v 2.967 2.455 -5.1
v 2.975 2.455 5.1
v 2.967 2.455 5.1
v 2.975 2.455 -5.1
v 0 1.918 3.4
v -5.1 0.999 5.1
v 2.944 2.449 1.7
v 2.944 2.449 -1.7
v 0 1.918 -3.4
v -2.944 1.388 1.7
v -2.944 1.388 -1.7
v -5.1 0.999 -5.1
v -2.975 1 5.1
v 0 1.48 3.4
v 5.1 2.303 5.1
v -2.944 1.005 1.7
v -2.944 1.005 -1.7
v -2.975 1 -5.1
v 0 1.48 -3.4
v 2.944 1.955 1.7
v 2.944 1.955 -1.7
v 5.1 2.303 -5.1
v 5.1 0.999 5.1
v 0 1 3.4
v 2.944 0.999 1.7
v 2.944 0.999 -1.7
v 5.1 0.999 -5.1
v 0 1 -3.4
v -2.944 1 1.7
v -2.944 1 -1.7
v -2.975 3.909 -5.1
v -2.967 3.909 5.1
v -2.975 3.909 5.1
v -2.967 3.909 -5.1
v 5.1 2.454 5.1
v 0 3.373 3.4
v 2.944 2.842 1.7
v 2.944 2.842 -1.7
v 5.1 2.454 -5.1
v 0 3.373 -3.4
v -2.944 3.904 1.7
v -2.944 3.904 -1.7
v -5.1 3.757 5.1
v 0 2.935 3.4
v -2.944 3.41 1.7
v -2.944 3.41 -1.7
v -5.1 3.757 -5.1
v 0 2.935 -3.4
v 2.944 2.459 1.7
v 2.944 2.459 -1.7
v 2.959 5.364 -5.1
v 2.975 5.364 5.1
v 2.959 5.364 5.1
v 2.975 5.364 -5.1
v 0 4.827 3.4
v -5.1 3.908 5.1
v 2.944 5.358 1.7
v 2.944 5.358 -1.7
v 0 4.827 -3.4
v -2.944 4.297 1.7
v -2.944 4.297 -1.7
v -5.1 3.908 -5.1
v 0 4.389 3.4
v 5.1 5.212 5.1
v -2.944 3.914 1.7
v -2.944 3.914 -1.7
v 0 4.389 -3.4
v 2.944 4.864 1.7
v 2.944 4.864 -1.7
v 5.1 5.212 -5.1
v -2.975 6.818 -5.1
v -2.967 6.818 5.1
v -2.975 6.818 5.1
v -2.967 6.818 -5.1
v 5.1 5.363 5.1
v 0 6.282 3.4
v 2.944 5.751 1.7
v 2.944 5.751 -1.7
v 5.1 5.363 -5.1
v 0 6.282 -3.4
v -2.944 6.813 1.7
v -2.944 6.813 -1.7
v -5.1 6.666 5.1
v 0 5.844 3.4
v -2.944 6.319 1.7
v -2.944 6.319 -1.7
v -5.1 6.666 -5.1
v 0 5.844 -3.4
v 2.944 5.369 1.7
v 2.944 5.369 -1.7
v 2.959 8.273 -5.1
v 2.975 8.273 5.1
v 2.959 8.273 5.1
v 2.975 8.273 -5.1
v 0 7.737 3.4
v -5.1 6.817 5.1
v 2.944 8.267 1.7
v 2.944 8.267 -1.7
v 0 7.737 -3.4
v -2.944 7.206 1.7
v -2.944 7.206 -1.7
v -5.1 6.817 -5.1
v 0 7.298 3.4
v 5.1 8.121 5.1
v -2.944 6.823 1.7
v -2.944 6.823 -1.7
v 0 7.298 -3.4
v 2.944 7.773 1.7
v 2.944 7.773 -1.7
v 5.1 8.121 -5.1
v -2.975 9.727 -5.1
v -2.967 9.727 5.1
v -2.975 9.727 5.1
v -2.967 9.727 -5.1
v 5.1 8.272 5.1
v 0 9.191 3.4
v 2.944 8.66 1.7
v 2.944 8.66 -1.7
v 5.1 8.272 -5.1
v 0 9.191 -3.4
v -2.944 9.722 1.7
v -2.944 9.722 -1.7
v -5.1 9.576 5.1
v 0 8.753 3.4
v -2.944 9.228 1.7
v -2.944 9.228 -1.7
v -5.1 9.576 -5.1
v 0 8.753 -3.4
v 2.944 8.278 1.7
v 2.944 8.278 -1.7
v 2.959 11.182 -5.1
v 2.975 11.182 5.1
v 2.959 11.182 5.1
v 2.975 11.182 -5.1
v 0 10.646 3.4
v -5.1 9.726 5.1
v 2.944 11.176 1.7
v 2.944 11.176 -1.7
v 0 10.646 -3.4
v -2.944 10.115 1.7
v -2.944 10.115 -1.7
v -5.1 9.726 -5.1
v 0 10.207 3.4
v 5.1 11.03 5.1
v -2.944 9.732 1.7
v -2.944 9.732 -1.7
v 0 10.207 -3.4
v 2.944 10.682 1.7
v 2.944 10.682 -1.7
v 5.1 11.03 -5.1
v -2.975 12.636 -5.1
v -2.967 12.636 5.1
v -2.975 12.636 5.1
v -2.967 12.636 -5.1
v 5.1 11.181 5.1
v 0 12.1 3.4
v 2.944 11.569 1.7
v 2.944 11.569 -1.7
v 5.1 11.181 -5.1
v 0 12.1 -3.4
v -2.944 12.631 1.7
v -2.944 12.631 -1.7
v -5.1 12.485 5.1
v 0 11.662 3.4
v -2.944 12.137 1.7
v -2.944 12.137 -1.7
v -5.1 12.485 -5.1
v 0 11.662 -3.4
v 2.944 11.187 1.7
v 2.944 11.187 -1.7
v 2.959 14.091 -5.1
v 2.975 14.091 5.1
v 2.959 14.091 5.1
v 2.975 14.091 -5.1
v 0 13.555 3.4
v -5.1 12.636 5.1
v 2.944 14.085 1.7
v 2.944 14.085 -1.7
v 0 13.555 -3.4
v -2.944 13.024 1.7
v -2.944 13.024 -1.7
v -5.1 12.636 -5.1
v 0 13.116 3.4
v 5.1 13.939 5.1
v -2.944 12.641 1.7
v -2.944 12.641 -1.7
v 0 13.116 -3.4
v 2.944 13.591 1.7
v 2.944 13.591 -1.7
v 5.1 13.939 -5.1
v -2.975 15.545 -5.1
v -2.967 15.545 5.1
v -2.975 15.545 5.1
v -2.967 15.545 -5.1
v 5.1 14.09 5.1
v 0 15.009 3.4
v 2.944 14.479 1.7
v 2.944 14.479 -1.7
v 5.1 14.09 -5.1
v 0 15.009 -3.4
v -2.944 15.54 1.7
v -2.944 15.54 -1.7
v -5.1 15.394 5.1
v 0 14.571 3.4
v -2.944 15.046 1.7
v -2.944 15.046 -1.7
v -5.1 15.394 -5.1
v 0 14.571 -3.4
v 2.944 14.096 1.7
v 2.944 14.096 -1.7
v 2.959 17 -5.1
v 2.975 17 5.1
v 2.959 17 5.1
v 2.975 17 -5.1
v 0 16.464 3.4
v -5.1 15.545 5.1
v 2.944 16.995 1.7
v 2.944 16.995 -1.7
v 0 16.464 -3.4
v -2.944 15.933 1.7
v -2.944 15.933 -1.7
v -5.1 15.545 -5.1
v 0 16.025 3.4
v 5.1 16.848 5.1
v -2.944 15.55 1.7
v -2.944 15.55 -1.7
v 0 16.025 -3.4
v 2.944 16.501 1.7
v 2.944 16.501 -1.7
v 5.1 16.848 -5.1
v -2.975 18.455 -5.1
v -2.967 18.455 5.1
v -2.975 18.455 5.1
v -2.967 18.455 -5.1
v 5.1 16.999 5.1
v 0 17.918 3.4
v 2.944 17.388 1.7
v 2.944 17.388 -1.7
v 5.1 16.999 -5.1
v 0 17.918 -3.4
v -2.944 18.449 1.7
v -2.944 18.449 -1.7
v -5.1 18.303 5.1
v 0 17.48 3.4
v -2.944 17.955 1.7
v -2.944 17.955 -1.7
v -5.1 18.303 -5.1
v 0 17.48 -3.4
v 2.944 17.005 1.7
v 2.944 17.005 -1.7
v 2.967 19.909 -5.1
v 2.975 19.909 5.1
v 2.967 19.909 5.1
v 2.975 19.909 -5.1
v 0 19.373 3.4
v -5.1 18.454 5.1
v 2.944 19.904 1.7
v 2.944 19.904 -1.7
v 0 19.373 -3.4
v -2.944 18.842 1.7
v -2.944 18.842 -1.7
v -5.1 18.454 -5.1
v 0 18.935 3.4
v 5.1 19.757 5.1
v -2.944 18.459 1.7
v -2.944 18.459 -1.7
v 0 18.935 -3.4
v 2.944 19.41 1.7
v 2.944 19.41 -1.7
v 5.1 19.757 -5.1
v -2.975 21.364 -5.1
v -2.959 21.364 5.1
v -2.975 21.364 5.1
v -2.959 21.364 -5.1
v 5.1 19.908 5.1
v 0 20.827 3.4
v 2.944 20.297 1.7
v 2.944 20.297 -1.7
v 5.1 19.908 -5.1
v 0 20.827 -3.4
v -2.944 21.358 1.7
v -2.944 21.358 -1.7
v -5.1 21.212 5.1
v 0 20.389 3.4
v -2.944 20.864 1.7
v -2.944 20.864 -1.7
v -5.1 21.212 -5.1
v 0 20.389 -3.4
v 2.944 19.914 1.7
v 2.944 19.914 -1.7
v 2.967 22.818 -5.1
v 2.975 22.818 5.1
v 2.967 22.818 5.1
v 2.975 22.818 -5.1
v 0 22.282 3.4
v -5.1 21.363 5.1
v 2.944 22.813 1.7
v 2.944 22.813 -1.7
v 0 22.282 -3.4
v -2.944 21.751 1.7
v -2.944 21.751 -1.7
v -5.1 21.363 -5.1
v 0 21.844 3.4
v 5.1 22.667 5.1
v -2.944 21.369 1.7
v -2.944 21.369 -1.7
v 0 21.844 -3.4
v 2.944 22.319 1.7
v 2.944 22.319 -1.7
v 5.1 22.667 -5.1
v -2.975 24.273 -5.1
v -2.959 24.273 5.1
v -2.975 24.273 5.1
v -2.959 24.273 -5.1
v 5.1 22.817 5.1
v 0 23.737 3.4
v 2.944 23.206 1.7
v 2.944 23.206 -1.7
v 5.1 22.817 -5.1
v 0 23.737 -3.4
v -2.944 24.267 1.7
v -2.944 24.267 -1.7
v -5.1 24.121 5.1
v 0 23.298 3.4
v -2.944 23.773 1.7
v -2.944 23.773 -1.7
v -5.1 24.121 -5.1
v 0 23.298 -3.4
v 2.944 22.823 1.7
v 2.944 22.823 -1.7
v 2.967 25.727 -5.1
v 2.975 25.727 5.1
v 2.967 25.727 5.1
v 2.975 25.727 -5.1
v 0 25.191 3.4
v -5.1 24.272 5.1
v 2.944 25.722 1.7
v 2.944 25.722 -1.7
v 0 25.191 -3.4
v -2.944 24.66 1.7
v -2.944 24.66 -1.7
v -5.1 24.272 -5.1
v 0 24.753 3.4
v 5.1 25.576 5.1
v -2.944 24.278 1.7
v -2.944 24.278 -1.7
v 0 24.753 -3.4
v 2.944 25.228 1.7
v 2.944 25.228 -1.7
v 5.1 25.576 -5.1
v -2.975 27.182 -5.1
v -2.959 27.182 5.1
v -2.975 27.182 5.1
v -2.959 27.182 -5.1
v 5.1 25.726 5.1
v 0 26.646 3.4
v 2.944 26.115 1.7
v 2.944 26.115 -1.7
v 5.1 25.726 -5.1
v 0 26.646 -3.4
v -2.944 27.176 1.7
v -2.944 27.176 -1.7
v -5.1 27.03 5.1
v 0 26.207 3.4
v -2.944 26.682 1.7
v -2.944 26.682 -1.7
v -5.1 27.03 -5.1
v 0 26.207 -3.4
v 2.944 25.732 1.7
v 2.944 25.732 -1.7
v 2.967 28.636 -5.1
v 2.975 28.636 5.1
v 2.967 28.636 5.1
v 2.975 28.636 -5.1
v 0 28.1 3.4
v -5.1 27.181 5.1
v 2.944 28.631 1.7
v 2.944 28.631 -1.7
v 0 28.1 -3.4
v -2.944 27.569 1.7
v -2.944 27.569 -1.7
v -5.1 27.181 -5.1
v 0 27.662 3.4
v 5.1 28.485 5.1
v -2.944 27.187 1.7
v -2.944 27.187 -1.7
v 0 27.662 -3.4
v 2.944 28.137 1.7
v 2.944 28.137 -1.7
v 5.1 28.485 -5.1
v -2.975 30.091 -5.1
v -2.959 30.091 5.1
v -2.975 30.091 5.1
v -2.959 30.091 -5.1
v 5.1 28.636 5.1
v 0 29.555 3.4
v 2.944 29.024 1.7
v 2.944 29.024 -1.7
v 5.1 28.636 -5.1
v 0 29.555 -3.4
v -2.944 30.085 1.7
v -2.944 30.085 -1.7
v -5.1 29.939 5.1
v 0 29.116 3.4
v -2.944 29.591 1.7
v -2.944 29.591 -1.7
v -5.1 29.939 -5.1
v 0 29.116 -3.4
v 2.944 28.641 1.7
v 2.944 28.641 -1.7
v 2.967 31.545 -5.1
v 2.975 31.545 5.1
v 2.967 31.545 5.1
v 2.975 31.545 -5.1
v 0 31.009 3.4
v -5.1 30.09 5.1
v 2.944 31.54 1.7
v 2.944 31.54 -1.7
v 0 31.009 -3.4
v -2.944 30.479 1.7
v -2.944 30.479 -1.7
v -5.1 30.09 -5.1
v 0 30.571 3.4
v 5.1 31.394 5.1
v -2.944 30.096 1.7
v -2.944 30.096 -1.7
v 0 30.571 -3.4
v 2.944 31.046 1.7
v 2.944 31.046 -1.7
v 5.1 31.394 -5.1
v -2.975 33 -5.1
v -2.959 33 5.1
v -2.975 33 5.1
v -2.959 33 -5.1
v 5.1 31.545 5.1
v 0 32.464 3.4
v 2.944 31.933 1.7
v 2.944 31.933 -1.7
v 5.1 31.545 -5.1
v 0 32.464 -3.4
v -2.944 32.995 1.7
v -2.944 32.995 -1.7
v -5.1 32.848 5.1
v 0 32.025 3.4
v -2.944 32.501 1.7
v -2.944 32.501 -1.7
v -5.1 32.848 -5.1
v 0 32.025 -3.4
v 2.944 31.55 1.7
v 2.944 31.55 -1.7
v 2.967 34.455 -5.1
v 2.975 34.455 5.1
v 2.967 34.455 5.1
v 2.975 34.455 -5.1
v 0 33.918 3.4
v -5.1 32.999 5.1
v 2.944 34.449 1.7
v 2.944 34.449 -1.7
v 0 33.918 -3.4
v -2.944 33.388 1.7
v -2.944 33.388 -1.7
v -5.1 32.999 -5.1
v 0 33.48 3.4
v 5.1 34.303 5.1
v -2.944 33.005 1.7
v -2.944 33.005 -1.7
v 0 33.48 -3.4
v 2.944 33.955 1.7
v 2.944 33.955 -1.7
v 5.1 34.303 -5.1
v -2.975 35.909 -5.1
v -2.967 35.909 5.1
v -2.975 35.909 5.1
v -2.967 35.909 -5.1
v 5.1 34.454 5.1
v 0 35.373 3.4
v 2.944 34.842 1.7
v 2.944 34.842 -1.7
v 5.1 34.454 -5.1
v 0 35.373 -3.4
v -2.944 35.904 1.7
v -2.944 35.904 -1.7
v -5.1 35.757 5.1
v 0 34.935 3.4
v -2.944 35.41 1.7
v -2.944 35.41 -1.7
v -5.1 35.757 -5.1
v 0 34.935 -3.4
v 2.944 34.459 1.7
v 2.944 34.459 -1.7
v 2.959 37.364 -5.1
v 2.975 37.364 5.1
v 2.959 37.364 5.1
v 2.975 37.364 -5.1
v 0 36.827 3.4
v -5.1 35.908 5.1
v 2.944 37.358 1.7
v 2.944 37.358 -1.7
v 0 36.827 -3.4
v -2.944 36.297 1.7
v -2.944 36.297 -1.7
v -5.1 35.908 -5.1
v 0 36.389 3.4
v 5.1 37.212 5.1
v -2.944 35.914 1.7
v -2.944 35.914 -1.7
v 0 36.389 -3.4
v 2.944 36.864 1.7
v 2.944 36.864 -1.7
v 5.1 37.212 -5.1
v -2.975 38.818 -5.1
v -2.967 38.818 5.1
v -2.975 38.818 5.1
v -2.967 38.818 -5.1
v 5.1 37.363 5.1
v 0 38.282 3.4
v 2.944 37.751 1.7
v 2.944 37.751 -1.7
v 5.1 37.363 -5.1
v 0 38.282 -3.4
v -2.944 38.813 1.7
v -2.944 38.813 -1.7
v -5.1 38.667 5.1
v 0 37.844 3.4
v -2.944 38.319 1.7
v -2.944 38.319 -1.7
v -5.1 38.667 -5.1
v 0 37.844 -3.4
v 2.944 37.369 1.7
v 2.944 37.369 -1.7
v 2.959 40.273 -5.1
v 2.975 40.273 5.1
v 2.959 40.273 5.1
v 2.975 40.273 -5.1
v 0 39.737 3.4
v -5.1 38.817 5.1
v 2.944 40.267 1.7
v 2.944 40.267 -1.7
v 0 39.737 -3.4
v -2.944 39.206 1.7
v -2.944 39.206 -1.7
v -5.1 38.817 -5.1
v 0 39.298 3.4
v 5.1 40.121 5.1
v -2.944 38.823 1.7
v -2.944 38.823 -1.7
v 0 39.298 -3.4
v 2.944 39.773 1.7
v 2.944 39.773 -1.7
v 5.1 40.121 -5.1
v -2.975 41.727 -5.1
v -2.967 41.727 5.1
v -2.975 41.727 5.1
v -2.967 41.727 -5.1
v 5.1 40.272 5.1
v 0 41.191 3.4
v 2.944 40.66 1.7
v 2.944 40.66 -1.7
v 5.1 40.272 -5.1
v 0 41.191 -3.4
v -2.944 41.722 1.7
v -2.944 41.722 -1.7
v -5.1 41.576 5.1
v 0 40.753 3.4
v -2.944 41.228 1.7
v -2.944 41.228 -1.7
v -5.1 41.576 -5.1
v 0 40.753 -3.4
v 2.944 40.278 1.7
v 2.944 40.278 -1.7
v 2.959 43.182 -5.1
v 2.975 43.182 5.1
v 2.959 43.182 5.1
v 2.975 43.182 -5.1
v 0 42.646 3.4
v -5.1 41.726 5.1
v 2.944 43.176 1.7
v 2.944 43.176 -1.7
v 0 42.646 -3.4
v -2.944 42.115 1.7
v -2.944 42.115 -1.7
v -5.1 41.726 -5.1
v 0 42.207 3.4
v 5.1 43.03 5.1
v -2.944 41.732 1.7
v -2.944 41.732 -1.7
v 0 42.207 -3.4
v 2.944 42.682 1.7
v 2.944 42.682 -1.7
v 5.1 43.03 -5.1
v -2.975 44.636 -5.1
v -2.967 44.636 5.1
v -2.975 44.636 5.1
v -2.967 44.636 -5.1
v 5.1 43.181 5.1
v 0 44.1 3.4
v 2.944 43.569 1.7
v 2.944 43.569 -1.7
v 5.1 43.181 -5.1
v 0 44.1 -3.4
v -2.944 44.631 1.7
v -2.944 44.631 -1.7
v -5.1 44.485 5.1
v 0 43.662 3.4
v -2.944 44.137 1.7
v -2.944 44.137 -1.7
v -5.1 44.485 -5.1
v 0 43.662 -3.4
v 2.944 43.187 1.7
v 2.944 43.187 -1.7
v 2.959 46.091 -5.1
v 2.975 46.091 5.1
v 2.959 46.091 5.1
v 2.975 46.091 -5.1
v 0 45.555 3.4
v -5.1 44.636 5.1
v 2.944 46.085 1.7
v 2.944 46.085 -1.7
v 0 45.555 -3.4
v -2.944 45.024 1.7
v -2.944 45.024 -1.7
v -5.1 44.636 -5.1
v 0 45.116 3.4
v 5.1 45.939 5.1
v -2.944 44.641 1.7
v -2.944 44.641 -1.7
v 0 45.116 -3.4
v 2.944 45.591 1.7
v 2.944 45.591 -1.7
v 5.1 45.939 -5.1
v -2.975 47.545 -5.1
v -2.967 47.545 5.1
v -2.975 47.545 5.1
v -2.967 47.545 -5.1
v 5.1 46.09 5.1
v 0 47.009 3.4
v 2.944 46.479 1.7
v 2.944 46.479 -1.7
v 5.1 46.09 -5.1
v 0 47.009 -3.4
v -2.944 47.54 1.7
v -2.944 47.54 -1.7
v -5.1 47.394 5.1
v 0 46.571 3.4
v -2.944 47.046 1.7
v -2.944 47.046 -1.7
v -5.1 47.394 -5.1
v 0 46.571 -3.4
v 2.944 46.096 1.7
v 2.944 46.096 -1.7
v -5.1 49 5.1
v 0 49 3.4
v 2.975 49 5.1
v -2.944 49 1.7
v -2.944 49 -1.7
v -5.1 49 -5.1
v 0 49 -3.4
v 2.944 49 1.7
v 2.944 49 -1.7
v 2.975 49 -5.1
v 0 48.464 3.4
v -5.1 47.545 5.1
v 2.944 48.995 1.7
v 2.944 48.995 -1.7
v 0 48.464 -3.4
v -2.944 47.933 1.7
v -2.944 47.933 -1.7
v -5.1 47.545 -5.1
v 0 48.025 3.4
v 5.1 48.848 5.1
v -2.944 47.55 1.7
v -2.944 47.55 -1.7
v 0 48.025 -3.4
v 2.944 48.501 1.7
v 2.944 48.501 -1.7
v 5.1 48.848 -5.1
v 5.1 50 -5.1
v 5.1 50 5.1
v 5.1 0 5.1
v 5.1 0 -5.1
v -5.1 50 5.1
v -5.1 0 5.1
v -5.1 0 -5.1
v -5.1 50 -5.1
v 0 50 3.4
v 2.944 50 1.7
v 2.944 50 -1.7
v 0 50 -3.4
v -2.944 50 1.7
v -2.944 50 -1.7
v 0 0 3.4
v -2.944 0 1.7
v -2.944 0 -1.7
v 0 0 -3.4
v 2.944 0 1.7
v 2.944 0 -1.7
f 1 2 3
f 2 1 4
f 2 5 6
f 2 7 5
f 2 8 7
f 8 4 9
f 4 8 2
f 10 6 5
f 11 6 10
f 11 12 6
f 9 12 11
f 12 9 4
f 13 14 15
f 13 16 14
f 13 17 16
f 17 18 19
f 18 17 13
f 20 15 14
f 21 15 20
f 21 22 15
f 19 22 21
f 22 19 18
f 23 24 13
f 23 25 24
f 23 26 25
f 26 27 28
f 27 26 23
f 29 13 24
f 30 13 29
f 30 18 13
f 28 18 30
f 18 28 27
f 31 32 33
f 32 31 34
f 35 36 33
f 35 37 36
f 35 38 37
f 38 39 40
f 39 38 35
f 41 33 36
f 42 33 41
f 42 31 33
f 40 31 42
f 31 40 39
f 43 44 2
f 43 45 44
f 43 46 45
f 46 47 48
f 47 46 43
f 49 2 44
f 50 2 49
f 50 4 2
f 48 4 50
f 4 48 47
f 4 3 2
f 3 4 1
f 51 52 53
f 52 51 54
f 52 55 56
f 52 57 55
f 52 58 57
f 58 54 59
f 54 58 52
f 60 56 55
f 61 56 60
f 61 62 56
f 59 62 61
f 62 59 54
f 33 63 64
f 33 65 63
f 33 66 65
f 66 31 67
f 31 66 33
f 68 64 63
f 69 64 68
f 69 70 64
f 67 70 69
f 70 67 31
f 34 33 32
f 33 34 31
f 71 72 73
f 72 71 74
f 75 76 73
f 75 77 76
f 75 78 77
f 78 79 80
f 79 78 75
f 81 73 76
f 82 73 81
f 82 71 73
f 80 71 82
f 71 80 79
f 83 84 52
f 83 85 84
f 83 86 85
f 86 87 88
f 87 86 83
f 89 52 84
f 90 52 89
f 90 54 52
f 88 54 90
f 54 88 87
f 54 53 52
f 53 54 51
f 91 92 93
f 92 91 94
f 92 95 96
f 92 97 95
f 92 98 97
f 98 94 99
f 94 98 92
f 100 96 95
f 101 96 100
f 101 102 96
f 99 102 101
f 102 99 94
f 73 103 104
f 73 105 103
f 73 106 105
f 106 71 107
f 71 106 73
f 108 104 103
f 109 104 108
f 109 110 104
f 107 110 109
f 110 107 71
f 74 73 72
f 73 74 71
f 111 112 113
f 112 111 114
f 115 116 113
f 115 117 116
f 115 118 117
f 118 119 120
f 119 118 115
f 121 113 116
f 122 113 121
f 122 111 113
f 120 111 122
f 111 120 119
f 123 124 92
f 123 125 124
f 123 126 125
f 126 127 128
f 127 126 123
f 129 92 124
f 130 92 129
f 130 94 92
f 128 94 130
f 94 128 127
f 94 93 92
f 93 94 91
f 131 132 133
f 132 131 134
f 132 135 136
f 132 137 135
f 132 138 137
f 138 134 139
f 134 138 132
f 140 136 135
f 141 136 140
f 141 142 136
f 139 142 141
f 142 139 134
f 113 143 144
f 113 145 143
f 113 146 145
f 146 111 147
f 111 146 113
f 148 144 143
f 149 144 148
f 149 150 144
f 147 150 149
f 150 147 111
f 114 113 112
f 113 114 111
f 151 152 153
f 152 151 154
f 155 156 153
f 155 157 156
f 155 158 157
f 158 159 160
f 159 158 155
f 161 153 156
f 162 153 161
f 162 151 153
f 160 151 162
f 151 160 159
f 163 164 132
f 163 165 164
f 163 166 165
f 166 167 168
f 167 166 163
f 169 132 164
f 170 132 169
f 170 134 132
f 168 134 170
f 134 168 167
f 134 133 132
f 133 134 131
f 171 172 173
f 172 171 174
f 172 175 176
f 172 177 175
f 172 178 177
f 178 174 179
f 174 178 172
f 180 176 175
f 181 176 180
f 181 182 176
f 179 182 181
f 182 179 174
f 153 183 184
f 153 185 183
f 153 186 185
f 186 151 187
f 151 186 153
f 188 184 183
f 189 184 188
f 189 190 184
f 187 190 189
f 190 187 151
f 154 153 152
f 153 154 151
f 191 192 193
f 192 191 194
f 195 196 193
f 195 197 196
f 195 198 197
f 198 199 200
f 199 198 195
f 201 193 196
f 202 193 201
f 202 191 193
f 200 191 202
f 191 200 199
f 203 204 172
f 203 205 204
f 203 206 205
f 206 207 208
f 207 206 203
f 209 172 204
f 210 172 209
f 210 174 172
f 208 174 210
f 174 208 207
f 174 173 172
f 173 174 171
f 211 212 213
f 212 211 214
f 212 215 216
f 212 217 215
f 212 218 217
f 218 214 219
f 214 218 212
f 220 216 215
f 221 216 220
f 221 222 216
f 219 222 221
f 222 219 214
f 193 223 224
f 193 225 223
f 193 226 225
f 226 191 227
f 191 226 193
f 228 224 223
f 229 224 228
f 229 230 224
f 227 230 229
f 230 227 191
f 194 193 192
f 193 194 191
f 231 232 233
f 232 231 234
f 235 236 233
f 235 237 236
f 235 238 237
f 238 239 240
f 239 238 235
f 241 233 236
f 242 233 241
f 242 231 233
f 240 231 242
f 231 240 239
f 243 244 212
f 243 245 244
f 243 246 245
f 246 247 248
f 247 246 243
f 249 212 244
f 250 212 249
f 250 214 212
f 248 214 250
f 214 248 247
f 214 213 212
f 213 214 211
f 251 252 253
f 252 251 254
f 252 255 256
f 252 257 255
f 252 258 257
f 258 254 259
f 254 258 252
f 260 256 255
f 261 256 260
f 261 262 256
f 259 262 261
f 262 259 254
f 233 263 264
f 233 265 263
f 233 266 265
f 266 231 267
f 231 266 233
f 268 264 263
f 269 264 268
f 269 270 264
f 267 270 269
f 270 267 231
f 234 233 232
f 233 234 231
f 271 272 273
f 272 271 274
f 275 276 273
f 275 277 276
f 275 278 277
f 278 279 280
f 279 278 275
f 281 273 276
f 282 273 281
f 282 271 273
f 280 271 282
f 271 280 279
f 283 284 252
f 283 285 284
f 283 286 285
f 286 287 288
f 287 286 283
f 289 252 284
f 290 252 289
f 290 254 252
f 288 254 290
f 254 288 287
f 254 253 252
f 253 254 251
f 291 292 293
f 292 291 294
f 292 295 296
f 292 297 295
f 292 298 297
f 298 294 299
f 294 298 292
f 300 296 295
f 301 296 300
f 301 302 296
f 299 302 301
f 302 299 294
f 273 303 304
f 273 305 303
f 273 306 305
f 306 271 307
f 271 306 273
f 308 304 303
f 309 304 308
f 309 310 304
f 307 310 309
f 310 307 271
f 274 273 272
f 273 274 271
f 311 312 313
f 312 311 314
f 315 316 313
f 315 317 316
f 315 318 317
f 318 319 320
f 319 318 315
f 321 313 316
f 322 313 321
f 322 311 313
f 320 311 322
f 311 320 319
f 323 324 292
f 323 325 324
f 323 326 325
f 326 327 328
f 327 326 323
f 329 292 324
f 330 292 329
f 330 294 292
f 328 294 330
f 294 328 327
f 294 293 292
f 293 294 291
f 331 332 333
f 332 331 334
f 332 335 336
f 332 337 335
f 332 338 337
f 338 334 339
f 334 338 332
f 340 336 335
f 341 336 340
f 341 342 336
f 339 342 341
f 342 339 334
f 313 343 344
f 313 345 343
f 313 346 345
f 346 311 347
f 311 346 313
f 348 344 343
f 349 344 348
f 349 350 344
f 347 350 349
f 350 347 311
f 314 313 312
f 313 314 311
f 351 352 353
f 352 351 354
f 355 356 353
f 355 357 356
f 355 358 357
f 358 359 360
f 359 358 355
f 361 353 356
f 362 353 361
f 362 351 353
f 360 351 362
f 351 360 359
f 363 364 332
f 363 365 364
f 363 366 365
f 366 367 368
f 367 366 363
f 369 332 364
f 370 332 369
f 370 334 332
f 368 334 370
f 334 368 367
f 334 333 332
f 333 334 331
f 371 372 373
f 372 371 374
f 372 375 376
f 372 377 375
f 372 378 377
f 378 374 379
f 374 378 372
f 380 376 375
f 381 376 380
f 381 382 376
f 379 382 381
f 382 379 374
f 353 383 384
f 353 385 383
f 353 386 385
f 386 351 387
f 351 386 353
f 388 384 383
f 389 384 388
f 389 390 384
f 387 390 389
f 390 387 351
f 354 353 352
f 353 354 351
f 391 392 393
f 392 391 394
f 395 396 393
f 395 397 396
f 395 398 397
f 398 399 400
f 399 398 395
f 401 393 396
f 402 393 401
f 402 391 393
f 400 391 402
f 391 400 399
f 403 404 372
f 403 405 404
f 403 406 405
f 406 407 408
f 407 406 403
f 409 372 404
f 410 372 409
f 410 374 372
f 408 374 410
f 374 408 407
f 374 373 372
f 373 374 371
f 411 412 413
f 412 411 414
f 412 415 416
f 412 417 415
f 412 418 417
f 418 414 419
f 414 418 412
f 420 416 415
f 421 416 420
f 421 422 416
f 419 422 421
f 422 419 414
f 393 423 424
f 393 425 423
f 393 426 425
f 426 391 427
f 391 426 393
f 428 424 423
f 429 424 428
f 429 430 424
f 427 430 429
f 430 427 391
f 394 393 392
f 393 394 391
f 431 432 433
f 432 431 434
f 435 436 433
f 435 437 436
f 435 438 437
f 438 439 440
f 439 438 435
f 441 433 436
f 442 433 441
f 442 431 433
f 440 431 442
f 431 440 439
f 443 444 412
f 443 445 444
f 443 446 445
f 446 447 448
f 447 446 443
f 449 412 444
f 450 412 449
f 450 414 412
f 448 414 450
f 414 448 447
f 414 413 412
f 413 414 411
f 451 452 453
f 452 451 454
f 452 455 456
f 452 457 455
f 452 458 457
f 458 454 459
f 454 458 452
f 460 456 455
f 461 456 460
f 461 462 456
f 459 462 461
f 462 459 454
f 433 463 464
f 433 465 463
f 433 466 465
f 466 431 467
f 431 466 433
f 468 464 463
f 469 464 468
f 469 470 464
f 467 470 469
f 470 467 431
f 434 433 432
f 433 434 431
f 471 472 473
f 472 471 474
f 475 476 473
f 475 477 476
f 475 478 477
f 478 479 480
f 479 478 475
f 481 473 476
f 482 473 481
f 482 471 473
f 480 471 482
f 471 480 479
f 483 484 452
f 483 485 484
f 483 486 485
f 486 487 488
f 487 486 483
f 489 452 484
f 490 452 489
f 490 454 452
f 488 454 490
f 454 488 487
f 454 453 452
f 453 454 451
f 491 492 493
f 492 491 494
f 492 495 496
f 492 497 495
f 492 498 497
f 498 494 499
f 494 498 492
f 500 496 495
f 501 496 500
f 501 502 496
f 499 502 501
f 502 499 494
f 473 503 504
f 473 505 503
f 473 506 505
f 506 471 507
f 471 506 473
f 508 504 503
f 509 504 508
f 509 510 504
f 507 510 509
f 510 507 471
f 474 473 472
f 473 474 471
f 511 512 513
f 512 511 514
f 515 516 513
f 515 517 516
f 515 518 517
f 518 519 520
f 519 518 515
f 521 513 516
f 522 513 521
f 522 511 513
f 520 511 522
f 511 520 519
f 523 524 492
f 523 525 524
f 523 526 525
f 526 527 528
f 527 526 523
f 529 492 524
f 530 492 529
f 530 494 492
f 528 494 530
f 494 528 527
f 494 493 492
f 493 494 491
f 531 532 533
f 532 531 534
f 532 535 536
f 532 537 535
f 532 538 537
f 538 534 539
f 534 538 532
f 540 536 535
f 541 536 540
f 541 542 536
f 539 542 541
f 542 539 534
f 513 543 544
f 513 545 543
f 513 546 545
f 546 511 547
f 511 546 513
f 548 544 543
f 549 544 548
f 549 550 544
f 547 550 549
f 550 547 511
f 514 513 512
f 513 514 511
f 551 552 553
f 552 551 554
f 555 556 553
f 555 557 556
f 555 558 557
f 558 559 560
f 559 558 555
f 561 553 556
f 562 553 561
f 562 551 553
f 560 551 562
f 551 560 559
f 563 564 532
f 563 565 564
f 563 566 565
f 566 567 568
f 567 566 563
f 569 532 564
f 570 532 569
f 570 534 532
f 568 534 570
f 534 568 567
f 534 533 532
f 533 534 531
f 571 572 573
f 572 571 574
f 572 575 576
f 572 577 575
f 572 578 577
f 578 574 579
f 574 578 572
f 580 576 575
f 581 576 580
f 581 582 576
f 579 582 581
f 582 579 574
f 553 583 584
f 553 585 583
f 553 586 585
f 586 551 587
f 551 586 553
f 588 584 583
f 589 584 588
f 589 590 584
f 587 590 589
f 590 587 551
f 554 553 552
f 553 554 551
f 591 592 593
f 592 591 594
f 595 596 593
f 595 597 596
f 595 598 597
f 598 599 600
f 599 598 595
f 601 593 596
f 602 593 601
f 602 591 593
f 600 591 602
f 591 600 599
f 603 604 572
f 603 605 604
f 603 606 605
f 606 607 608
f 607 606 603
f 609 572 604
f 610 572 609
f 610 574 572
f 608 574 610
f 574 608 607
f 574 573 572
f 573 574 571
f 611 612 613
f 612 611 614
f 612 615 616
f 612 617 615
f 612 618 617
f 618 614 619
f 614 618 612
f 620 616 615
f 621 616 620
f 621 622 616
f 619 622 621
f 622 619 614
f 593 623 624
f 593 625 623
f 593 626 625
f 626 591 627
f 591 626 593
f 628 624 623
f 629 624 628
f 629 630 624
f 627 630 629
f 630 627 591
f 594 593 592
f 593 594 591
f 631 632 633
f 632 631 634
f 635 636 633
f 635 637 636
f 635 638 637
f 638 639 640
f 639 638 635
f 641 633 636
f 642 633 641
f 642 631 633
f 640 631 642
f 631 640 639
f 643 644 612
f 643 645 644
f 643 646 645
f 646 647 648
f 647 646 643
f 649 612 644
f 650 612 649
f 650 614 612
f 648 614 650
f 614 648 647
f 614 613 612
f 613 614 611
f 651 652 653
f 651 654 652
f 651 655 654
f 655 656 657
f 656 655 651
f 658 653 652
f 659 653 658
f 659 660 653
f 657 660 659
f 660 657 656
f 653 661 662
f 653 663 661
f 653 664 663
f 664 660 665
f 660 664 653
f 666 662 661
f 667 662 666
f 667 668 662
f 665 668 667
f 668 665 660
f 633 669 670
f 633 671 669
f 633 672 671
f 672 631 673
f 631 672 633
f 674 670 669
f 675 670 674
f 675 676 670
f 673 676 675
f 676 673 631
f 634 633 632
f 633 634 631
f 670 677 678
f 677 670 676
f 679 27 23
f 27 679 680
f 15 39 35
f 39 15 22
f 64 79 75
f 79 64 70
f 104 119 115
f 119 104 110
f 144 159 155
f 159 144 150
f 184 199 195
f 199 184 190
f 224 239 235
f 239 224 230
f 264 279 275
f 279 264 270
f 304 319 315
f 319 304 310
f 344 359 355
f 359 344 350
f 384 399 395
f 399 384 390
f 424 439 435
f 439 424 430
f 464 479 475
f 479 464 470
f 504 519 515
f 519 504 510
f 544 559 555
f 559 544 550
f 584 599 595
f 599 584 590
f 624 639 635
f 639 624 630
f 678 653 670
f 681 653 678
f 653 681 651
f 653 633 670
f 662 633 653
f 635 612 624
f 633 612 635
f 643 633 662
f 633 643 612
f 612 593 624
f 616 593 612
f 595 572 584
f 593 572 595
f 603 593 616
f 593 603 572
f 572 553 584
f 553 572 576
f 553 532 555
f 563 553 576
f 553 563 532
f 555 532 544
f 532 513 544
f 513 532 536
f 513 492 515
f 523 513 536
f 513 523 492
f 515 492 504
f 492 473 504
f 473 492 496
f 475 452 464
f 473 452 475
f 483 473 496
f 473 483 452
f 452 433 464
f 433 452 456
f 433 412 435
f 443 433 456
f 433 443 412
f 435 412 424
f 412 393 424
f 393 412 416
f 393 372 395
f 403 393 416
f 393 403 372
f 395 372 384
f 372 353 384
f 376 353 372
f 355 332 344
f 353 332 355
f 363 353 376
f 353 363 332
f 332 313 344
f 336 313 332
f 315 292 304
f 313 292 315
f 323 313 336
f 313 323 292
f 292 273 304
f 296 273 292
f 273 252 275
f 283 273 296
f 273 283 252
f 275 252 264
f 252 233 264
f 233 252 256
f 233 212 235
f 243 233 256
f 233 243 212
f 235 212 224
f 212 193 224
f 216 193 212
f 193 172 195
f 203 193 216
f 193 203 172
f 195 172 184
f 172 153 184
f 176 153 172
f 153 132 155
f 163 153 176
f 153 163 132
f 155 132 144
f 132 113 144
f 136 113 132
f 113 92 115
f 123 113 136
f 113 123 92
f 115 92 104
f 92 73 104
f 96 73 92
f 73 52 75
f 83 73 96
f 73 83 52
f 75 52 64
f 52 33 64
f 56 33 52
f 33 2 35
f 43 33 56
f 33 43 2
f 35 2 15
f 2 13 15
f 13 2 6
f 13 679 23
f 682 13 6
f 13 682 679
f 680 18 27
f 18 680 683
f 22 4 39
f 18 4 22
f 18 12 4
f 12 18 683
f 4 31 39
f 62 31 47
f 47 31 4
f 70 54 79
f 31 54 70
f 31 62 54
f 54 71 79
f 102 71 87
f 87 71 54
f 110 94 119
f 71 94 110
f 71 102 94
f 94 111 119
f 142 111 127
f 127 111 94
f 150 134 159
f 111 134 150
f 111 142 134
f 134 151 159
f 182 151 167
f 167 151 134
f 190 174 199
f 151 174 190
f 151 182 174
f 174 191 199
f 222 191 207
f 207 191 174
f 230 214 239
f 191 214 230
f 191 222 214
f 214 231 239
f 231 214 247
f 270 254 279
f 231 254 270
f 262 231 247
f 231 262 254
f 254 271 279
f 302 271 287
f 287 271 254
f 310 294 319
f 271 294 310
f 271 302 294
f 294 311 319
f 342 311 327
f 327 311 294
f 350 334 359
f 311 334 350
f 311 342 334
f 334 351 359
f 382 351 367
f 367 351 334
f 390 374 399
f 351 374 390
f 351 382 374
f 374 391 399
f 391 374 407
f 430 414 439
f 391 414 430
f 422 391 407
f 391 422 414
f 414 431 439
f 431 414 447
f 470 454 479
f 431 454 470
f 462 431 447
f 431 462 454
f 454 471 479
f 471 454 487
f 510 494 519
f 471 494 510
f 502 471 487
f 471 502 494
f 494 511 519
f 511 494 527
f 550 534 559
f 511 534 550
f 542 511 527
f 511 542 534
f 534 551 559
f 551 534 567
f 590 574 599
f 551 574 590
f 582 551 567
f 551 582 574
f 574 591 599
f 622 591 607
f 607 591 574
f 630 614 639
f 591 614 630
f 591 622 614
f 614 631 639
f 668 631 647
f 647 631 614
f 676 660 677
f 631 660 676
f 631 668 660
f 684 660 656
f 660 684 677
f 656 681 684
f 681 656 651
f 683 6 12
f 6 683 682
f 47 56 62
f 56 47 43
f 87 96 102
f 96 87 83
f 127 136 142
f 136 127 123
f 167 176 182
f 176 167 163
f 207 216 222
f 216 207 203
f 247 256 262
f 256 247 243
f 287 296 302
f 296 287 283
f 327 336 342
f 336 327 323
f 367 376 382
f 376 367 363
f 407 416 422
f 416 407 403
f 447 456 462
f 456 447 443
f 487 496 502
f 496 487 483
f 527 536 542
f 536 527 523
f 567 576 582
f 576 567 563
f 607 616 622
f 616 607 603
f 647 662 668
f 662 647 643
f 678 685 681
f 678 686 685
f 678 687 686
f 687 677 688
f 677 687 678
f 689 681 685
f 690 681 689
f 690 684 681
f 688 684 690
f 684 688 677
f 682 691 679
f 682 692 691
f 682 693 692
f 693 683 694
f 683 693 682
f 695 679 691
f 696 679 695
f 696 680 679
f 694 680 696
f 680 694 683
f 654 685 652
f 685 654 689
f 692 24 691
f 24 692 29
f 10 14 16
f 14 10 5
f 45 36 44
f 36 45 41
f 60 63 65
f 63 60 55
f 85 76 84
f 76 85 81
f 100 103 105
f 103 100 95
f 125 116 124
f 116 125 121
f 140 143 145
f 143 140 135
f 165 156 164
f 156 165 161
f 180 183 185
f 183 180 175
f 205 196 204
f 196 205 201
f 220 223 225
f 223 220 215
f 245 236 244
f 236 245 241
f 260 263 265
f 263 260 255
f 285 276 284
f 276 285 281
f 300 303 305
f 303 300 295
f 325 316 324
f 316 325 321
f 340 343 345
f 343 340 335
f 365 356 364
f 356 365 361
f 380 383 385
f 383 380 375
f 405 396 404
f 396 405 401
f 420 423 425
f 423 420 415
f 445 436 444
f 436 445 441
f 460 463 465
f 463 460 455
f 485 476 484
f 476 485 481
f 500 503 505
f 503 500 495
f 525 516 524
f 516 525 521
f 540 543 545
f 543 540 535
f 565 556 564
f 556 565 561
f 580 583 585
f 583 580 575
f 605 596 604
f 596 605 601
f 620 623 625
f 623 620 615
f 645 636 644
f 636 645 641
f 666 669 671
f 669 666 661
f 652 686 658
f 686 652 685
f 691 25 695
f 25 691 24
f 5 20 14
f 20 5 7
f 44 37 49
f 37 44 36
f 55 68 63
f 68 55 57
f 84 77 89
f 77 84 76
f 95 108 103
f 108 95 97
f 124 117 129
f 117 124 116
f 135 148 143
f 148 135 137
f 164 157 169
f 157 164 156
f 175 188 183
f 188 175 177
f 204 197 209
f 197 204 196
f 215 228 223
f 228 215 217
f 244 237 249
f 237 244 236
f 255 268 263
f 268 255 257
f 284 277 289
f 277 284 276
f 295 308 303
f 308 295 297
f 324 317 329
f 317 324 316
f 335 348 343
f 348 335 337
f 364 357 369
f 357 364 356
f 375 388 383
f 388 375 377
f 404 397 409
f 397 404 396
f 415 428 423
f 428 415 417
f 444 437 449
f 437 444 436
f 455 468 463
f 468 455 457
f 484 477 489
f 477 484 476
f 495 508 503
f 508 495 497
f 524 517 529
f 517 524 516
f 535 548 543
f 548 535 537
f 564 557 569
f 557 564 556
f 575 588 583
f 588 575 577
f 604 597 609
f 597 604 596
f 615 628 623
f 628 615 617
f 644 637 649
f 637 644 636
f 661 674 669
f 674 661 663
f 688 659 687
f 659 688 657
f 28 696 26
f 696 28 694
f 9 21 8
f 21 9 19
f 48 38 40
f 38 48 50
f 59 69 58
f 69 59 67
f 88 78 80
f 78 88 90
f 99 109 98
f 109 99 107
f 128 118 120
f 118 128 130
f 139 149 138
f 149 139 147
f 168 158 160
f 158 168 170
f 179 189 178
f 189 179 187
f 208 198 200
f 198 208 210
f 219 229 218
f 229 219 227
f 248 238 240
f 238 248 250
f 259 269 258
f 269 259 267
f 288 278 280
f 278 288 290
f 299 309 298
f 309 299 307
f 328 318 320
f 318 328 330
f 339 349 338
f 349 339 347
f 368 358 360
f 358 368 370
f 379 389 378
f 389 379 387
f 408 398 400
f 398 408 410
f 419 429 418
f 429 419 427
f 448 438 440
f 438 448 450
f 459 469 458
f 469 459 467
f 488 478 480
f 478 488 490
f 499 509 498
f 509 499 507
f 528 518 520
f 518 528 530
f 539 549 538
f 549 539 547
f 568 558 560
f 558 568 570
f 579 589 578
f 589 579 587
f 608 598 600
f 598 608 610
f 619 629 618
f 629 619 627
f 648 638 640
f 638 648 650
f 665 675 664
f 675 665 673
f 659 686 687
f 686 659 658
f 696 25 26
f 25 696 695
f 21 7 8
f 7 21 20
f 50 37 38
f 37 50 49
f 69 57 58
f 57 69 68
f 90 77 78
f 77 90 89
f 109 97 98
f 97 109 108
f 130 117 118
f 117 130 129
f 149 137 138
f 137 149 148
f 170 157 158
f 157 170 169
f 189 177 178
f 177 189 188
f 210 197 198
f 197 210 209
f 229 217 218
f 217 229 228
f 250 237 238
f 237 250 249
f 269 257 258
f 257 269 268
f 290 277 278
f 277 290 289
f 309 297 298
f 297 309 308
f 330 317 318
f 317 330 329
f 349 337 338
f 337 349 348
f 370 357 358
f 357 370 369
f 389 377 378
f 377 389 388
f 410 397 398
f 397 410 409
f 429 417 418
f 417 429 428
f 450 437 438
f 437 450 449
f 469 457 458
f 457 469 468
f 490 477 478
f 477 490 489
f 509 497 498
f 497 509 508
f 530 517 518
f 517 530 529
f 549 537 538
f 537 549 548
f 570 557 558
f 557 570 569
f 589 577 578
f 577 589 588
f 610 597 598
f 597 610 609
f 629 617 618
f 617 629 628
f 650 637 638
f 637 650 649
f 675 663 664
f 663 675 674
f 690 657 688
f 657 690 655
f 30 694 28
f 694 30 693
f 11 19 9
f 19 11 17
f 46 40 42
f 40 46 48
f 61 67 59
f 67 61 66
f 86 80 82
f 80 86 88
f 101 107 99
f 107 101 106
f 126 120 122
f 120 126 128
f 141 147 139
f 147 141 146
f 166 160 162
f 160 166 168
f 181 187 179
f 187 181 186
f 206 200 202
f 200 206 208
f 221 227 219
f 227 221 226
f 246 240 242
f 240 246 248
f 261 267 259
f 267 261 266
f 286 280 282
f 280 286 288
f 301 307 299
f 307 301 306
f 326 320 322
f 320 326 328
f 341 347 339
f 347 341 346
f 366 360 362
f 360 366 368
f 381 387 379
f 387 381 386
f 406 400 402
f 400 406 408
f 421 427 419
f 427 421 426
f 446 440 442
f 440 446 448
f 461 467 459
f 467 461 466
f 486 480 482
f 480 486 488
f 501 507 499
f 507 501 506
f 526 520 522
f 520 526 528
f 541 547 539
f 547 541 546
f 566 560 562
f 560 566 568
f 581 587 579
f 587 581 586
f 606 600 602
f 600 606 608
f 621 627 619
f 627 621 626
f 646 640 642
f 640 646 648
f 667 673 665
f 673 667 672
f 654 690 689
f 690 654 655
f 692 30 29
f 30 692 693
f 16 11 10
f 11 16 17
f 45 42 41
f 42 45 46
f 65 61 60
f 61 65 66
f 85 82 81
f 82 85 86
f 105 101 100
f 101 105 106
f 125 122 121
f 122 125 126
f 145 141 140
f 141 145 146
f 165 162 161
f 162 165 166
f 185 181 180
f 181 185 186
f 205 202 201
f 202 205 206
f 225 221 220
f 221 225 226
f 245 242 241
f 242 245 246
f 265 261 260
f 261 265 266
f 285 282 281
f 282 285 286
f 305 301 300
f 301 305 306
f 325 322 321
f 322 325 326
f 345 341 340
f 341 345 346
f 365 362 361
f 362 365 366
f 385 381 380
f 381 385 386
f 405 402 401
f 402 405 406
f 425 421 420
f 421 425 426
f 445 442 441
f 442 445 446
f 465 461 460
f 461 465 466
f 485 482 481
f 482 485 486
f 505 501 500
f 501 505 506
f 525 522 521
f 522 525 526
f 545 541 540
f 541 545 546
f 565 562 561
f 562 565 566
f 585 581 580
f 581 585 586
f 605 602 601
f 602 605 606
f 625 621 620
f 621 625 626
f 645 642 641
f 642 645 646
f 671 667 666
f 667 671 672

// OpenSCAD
//  Amount of edges of the hole through the spring
$fn = 6;

//  Radius of the hole through the spring
radius = 3.4;

//  Dimension of the spring
base = 10.2;

//  Height of the base plates of the spring
baseHeight = 1;

//  Thickness of the spring
thickness = 0.3;

//  Length of the spring
length = 50;

//  Amount of leaves in the spring
amount = 33;

module spring(){
    leaveHeight = (length - 2 * baseHeight) / amount;
    ty = thickness / (2 * cos(atan(leaveHeight / base)));
    tx = thickness / (sin(atan(leaveHeight / base)));
    tolerance = 0.001;
    
    difference(){
        translate([-1/2 * base, 0, -1/2 * base]){
            cube([base, length, base]);
        }
        rotate([-90, -30, 0]){
            translate([0, 0, -0.1]){
                cylinder(r = radius, h = length + 0.2);
            }
        }
        translate([0, baseHeight, 0]){
            for(i = [1:amount]){
                rotate([0, i * 180, 0]){
                    translate([0, (i - 1) * leaveHeight, -(1/2 * base + 0.1)]){
                        linear_extrude(height =  base + 0.2){
                            polygon(    points  =   [   [-1/2 * base - tolerance, -tolerance],
                                                        [1/2 * base - tx, 0],
                                                        [-1/2 * base - tolerance, leaveHeight - ty]  ],
                                        paths   =   [[0,1,2]]   );
                            polygon(    points  =   [   [1/2 * base + tolerance, -tolerance],
                                                        [1/2 * base + tolerance, leaveHeight],
                                                        [-1/2 * base + tx, leaveHeight]  ],
                                        paths   =   [[0,1,2]]   );
                        }
                    }
                }
            }
        }
    }
}

spring();
